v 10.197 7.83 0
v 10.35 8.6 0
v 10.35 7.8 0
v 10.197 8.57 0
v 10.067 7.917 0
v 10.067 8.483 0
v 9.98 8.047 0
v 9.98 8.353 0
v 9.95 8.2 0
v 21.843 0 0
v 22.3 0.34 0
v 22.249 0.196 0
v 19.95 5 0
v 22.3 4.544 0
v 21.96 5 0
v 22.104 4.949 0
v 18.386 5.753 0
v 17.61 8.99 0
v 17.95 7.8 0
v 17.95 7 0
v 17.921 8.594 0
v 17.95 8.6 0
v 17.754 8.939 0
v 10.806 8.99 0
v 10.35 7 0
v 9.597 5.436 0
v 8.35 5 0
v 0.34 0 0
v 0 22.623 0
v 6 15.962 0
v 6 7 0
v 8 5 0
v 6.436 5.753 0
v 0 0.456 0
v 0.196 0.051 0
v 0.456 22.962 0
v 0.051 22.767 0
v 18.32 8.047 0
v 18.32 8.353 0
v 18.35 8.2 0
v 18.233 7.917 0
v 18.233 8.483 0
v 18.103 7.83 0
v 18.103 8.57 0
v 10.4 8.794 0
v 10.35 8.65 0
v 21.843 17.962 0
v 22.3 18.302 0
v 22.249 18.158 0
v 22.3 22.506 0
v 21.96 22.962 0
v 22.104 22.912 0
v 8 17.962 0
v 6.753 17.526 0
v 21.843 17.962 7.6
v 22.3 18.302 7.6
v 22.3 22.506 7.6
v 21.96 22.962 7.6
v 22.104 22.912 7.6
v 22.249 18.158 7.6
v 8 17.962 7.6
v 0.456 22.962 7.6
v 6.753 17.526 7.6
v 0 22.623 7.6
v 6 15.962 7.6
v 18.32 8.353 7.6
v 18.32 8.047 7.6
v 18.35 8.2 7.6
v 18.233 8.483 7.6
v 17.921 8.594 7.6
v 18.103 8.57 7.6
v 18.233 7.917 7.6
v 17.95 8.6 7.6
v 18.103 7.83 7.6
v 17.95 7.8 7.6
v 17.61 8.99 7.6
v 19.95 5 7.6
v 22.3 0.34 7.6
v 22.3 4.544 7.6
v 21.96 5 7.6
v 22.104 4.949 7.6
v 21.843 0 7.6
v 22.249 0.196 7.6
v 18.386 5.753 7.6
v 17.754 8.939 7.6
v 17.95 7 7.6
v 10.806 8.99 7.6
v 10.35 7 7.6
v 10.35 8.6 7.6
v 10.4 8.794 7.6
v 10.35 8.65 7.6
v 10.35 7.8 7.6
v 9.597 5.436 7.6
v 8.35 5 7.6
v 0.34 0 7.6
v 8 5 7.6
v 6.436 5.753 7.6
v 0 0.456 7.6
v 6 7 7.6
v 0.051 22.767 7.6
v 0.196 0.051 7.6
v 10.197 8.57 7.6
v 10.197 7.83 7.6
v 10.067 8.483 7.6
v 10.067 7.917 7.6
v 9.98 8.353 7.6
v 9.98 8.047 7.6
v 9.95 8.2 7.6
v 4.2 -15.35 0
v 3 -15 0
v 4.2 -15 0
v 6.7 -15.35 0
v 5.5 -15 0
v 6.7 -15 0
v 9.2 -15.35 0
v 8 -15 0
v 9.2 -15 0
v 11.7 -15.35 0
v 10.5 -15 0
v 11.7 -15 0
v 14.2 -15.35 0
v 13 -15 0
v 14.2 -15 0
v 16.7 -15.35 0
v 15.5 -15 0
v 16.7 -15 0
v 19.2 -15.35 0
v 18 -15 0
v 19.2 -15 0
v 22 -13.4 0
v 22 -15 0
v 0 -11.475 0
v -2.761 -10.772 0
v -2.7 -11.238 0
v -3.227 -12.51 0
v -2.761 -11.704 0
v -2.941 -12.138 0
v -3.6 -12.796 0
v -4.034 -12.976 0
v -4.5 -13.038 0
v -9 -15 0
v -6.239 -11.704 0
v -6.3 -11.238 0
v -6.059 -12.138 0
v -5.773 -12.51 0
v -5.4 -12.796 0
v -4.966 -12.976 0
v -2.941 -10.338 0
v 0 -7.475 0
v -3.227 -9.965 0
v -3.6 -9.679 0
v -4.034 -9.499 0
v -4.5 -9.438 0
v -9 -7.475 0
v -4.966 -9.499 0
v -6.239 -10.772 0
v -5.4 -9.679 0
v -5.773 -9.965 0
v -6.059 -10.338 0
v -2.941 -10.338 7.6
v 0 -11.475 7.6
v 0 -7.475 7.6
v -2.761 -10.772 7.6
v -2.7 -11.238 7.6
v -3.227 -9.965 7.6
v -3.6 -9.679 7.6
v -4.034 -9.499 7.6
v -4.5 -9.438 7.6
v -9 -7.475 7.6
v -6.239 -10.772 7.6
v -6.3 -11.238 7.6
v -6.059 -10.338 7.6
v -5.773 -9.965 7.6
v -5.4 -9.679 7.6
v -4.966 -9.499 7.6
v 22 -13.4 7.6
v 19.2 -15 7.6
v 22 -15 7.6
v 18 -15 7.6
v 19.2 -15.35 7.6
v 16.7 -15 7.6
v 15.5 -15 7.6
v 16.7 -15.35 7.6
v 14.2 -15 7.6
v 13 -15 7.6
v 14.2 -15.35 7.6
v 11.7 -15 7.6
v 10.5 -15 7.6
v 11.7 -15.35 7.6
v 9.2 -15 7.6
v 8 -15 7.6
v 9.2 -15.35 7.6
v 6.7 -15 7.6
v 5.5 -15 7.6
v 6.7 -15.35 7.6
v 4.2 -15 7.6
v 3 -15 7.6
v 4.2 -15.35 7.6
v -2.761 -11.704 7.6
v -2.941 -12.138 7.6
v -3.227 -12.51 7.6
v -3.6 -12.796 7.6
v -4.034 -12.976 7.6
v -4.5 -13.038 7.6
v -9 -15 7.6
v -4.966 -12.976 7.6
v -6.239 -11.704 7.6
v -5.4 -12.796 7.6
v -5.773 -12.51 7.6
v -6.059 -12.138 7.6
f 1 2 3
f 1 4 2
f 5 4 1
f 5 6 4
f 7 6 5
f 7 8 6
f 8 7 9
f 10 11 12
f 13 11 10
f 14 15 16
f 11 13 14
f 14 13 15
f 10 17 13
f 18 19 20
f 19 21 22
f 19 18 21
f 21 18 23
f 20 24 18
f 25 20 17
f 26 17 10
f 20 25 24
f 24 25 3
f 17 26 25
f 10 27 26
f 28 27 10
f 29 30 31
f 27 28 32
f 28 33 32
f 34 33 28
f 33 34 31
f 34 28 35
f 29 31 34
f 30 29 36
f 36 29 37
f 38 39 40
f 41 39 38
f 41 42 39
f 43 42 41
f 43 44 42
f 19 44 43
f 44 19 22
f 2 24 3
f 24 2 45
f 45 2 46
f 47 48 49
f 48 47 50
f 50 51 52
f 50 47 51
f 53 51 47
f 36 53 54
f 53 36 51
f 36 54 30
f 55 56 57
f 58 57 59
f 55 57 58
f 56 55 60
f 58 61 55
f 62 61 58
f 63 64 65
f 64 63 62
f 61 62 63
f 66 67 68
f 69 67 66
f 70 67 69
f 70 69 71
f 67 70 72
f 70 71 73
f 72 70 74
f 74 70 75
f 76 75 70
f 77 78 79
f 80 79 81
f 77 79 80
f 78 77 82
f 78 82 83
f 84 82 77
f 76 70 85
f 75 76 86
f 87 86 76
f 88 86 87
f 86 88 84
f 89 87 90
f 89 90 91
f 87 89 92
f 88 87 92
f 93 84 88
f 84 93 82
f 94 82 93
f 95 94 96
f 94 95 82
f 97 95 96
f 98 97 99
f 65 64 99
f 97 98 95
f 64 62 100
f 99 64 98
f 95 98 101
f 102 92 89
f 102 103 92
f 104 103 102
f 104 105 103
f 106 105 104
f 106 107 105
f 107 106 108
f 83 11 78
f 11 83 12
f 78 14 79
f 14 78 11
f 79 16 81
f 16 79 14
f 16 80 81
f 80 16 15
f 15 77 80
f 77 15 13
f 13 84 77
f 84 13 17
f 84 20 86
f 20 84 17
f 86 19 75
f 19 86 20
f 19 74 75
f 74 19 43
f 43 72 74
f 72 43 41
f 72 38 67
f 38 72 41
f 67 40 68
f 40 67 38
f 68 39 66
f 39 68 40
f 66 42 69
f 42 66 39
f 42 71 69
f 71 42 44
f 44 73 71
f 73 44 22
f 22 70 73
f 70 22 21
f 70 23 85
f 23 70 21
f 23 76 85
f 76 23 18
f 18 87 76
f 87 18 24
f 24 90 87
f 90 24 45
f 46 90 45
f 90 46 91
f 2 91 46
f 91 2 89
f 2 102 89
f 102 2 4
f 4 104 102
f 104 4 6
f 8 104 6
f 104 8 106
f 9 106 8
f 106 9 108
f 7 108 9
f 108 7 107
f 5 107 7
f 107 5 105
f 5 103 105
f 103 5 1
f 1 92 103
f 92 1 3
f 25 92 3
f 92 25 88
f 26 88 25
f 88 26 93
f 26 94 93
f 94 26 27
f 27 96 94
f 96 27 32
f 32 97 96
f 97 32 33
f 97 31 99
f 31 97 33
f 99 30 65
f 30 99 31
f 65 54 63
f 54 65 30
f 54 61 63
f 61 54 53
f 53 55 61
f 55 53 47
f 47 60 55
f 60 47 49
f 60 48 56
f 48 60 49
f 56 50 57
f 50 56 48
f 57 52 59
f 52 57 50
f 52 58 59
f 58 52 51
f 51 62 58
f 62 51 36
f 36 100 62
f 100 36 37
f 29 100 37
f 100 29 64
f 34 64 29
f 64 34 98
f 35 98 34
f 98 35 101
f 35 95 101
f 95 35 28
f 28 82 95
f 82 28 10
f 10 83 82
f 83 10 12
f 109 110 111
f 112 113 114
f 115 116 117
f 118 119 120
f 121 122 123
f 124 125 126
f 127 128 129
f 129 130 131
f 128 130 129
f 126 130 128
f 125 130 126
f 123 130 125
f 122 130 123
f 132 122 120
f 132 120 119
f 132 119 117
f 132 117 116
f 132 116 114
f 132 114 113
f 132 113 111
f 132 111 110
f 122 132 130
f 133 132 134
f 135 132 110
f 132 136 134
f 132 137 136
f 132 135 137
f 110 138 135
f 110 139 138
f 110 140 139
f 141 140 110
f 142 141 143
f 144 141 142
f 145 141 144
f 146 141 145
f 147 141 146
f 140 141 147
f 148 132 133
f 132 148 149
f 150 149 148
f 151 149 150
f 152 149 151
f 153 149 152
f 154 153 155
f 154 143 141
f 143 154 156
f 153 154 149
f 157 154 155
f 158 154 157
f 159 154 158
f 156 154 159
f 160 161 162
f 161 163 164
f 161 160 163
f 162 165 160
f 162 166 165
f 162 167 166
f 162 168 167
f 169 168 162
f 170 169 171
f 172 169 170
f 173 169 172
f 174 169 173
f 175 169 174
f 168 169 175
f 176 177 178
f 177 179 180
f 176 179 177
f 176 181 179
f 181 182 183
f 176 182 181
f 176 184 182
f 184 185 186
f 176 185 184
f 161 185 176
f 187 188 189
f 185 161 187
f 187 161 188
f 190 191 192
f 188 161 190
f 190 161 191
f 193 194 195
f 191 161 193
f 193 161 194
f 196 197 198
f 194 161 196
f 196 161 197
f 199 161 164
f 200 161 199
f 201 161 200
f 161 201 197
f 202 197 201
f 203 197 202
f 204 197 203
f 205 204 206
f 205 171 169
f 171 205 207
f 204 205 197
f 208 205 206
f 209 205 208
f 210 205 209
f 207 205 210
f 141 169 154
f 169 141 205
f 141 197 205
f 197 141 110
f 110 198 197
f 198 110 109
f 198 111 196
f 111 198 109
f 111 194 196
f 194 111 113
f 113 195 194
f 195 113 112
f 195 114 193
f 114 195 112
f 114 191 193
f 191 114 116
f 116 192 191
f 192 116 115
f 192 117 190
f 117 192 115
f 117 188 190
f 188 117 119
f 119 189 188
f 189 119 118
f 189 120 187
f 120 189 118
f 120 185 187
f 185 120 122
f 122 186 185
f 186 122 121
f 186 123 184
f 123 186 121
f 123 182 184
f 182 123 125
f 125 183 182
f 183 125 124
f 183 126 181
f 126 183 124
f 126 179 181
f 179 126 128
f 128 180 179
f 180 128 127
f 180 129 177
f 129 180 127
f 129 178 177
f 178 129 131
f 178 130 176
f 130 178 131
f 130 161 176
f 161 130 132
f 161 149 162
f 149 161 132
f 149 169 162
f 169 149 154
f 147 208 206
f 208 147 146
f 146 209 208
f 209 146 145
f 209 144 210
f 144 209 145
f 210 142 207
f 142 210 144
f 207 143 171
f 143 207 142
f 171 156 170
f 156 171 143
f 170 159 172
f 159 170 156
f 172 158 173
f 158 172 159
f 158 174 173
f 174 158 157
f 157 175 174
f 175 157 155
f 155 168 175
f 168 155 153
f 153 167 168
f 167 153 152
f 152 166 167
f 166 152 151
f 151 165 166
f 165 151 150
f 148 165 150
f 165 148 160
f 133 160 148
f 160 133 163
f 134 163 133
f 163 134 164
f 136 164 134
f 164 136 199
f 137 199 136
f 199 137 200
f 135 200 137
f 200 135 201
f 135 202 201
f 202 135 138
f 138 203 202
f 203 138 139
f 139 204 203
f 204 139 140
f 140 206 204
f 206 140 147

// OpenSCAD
// Moldmaker flange wedge-clip. Profile in XY, extruded T. Print flat, PETG, no supports.
// X = into flange (from flange outer edge), Y = stack direction (bottom half -> top half).
flange_t=5; slot=8.3; clr=0.2;   // flange per half, through slot, clearance per side
slot_edge=4;                      // flange outer edge -> slot edge
taper=5; wedgeL=22; wedge_tip=1.6;
back=6; arm=5; R=2;
part="all";                       // all | frame | wedge | assembly
lugw=slot-0.7;                    // 7.6 (team spec: 0.35/side in slot)
T=lugw;                           // extrusion = lug width
stack=2*flange_t;
wedge_mid=wedge_tip+wedgeL/2*tan(taper);
open=stack+2*clr+wedge_mid;       // U opening
reachX=slot_edge+slot+4;          // arms reach past the slot
lug_h=flange_t-1;                 // lug enters bottom flange slot
lug_x=back+slot_edge+(slot-lugw)/2;
module frame2d(){
  offset(r=-R) offset(r=R) union(){
    square([back,open+2*arm]);                          // back
    square([back+reachX,arm]);                          // bottom arm
    translate([0,arm+open]) square([back+reachX,arm]);  // top arm
    translate([lug_x,arm-0.01]) square([lugw,lug_h]);   // lug into slot
  }
  translate([lug_x+lugw,arm+lug_h-0.8]) circle(0.4,$fn=16);  // tip detent 0.4
  translate([lug_x,arm+lug_h-0.8]) circle(0.4,$fn=16);
}
module wedge2d(){
  w1=wedge_tip+wedgeL*tan(taper);
  polygon([[0,0],[wedgeL,0],[wedgeL,wedge_tip],[0,w1]]);  // thick end out (x=0)
  for(x=[3:2.5:wedgeL-3]) translate([x,0]) polygon([[0,0],[1.2,0],[1.2,-0.35]]); // ratchet teeth (bottom)
  translate([-9,0]) difference(){square([9,w1+4]); translate([4.5,(w1+4)/2]) circle(1.8,$fn=24);} // pull tab
}
if(part=="frame") linear_extrude(T) frame2d();
else if(part=="wedge") linear_extrude(T) wedge2d();
else if(part=="assembly"){ linear_extrude(T) frame2d();
  color("red") translate([back+reachX+9-wedgeL-2,arm+open-wedge_mid-0.05,0]) mirror([1,0]) translate([-wedgeL,0]) linear_extrude(T) wedge2d();
  %translate([back,arm+clr,-5]) difference(){cube([40,stack,T+10]); translate([slot_edge,-1,(T+10-slot)/2]) cube([slot,stack+2,slot]);}}
else { linear_extrude(T) frame2d(); translate([0,-15,0]) linear_extrude(T) wedge2d(); }
echo(open=open, H=open+2*arm, L=back+reachX, T=T, lugw=lugw, lug_h=lug_h, wedge_thick=wedge_tip+wedgeL*tan(taper));
